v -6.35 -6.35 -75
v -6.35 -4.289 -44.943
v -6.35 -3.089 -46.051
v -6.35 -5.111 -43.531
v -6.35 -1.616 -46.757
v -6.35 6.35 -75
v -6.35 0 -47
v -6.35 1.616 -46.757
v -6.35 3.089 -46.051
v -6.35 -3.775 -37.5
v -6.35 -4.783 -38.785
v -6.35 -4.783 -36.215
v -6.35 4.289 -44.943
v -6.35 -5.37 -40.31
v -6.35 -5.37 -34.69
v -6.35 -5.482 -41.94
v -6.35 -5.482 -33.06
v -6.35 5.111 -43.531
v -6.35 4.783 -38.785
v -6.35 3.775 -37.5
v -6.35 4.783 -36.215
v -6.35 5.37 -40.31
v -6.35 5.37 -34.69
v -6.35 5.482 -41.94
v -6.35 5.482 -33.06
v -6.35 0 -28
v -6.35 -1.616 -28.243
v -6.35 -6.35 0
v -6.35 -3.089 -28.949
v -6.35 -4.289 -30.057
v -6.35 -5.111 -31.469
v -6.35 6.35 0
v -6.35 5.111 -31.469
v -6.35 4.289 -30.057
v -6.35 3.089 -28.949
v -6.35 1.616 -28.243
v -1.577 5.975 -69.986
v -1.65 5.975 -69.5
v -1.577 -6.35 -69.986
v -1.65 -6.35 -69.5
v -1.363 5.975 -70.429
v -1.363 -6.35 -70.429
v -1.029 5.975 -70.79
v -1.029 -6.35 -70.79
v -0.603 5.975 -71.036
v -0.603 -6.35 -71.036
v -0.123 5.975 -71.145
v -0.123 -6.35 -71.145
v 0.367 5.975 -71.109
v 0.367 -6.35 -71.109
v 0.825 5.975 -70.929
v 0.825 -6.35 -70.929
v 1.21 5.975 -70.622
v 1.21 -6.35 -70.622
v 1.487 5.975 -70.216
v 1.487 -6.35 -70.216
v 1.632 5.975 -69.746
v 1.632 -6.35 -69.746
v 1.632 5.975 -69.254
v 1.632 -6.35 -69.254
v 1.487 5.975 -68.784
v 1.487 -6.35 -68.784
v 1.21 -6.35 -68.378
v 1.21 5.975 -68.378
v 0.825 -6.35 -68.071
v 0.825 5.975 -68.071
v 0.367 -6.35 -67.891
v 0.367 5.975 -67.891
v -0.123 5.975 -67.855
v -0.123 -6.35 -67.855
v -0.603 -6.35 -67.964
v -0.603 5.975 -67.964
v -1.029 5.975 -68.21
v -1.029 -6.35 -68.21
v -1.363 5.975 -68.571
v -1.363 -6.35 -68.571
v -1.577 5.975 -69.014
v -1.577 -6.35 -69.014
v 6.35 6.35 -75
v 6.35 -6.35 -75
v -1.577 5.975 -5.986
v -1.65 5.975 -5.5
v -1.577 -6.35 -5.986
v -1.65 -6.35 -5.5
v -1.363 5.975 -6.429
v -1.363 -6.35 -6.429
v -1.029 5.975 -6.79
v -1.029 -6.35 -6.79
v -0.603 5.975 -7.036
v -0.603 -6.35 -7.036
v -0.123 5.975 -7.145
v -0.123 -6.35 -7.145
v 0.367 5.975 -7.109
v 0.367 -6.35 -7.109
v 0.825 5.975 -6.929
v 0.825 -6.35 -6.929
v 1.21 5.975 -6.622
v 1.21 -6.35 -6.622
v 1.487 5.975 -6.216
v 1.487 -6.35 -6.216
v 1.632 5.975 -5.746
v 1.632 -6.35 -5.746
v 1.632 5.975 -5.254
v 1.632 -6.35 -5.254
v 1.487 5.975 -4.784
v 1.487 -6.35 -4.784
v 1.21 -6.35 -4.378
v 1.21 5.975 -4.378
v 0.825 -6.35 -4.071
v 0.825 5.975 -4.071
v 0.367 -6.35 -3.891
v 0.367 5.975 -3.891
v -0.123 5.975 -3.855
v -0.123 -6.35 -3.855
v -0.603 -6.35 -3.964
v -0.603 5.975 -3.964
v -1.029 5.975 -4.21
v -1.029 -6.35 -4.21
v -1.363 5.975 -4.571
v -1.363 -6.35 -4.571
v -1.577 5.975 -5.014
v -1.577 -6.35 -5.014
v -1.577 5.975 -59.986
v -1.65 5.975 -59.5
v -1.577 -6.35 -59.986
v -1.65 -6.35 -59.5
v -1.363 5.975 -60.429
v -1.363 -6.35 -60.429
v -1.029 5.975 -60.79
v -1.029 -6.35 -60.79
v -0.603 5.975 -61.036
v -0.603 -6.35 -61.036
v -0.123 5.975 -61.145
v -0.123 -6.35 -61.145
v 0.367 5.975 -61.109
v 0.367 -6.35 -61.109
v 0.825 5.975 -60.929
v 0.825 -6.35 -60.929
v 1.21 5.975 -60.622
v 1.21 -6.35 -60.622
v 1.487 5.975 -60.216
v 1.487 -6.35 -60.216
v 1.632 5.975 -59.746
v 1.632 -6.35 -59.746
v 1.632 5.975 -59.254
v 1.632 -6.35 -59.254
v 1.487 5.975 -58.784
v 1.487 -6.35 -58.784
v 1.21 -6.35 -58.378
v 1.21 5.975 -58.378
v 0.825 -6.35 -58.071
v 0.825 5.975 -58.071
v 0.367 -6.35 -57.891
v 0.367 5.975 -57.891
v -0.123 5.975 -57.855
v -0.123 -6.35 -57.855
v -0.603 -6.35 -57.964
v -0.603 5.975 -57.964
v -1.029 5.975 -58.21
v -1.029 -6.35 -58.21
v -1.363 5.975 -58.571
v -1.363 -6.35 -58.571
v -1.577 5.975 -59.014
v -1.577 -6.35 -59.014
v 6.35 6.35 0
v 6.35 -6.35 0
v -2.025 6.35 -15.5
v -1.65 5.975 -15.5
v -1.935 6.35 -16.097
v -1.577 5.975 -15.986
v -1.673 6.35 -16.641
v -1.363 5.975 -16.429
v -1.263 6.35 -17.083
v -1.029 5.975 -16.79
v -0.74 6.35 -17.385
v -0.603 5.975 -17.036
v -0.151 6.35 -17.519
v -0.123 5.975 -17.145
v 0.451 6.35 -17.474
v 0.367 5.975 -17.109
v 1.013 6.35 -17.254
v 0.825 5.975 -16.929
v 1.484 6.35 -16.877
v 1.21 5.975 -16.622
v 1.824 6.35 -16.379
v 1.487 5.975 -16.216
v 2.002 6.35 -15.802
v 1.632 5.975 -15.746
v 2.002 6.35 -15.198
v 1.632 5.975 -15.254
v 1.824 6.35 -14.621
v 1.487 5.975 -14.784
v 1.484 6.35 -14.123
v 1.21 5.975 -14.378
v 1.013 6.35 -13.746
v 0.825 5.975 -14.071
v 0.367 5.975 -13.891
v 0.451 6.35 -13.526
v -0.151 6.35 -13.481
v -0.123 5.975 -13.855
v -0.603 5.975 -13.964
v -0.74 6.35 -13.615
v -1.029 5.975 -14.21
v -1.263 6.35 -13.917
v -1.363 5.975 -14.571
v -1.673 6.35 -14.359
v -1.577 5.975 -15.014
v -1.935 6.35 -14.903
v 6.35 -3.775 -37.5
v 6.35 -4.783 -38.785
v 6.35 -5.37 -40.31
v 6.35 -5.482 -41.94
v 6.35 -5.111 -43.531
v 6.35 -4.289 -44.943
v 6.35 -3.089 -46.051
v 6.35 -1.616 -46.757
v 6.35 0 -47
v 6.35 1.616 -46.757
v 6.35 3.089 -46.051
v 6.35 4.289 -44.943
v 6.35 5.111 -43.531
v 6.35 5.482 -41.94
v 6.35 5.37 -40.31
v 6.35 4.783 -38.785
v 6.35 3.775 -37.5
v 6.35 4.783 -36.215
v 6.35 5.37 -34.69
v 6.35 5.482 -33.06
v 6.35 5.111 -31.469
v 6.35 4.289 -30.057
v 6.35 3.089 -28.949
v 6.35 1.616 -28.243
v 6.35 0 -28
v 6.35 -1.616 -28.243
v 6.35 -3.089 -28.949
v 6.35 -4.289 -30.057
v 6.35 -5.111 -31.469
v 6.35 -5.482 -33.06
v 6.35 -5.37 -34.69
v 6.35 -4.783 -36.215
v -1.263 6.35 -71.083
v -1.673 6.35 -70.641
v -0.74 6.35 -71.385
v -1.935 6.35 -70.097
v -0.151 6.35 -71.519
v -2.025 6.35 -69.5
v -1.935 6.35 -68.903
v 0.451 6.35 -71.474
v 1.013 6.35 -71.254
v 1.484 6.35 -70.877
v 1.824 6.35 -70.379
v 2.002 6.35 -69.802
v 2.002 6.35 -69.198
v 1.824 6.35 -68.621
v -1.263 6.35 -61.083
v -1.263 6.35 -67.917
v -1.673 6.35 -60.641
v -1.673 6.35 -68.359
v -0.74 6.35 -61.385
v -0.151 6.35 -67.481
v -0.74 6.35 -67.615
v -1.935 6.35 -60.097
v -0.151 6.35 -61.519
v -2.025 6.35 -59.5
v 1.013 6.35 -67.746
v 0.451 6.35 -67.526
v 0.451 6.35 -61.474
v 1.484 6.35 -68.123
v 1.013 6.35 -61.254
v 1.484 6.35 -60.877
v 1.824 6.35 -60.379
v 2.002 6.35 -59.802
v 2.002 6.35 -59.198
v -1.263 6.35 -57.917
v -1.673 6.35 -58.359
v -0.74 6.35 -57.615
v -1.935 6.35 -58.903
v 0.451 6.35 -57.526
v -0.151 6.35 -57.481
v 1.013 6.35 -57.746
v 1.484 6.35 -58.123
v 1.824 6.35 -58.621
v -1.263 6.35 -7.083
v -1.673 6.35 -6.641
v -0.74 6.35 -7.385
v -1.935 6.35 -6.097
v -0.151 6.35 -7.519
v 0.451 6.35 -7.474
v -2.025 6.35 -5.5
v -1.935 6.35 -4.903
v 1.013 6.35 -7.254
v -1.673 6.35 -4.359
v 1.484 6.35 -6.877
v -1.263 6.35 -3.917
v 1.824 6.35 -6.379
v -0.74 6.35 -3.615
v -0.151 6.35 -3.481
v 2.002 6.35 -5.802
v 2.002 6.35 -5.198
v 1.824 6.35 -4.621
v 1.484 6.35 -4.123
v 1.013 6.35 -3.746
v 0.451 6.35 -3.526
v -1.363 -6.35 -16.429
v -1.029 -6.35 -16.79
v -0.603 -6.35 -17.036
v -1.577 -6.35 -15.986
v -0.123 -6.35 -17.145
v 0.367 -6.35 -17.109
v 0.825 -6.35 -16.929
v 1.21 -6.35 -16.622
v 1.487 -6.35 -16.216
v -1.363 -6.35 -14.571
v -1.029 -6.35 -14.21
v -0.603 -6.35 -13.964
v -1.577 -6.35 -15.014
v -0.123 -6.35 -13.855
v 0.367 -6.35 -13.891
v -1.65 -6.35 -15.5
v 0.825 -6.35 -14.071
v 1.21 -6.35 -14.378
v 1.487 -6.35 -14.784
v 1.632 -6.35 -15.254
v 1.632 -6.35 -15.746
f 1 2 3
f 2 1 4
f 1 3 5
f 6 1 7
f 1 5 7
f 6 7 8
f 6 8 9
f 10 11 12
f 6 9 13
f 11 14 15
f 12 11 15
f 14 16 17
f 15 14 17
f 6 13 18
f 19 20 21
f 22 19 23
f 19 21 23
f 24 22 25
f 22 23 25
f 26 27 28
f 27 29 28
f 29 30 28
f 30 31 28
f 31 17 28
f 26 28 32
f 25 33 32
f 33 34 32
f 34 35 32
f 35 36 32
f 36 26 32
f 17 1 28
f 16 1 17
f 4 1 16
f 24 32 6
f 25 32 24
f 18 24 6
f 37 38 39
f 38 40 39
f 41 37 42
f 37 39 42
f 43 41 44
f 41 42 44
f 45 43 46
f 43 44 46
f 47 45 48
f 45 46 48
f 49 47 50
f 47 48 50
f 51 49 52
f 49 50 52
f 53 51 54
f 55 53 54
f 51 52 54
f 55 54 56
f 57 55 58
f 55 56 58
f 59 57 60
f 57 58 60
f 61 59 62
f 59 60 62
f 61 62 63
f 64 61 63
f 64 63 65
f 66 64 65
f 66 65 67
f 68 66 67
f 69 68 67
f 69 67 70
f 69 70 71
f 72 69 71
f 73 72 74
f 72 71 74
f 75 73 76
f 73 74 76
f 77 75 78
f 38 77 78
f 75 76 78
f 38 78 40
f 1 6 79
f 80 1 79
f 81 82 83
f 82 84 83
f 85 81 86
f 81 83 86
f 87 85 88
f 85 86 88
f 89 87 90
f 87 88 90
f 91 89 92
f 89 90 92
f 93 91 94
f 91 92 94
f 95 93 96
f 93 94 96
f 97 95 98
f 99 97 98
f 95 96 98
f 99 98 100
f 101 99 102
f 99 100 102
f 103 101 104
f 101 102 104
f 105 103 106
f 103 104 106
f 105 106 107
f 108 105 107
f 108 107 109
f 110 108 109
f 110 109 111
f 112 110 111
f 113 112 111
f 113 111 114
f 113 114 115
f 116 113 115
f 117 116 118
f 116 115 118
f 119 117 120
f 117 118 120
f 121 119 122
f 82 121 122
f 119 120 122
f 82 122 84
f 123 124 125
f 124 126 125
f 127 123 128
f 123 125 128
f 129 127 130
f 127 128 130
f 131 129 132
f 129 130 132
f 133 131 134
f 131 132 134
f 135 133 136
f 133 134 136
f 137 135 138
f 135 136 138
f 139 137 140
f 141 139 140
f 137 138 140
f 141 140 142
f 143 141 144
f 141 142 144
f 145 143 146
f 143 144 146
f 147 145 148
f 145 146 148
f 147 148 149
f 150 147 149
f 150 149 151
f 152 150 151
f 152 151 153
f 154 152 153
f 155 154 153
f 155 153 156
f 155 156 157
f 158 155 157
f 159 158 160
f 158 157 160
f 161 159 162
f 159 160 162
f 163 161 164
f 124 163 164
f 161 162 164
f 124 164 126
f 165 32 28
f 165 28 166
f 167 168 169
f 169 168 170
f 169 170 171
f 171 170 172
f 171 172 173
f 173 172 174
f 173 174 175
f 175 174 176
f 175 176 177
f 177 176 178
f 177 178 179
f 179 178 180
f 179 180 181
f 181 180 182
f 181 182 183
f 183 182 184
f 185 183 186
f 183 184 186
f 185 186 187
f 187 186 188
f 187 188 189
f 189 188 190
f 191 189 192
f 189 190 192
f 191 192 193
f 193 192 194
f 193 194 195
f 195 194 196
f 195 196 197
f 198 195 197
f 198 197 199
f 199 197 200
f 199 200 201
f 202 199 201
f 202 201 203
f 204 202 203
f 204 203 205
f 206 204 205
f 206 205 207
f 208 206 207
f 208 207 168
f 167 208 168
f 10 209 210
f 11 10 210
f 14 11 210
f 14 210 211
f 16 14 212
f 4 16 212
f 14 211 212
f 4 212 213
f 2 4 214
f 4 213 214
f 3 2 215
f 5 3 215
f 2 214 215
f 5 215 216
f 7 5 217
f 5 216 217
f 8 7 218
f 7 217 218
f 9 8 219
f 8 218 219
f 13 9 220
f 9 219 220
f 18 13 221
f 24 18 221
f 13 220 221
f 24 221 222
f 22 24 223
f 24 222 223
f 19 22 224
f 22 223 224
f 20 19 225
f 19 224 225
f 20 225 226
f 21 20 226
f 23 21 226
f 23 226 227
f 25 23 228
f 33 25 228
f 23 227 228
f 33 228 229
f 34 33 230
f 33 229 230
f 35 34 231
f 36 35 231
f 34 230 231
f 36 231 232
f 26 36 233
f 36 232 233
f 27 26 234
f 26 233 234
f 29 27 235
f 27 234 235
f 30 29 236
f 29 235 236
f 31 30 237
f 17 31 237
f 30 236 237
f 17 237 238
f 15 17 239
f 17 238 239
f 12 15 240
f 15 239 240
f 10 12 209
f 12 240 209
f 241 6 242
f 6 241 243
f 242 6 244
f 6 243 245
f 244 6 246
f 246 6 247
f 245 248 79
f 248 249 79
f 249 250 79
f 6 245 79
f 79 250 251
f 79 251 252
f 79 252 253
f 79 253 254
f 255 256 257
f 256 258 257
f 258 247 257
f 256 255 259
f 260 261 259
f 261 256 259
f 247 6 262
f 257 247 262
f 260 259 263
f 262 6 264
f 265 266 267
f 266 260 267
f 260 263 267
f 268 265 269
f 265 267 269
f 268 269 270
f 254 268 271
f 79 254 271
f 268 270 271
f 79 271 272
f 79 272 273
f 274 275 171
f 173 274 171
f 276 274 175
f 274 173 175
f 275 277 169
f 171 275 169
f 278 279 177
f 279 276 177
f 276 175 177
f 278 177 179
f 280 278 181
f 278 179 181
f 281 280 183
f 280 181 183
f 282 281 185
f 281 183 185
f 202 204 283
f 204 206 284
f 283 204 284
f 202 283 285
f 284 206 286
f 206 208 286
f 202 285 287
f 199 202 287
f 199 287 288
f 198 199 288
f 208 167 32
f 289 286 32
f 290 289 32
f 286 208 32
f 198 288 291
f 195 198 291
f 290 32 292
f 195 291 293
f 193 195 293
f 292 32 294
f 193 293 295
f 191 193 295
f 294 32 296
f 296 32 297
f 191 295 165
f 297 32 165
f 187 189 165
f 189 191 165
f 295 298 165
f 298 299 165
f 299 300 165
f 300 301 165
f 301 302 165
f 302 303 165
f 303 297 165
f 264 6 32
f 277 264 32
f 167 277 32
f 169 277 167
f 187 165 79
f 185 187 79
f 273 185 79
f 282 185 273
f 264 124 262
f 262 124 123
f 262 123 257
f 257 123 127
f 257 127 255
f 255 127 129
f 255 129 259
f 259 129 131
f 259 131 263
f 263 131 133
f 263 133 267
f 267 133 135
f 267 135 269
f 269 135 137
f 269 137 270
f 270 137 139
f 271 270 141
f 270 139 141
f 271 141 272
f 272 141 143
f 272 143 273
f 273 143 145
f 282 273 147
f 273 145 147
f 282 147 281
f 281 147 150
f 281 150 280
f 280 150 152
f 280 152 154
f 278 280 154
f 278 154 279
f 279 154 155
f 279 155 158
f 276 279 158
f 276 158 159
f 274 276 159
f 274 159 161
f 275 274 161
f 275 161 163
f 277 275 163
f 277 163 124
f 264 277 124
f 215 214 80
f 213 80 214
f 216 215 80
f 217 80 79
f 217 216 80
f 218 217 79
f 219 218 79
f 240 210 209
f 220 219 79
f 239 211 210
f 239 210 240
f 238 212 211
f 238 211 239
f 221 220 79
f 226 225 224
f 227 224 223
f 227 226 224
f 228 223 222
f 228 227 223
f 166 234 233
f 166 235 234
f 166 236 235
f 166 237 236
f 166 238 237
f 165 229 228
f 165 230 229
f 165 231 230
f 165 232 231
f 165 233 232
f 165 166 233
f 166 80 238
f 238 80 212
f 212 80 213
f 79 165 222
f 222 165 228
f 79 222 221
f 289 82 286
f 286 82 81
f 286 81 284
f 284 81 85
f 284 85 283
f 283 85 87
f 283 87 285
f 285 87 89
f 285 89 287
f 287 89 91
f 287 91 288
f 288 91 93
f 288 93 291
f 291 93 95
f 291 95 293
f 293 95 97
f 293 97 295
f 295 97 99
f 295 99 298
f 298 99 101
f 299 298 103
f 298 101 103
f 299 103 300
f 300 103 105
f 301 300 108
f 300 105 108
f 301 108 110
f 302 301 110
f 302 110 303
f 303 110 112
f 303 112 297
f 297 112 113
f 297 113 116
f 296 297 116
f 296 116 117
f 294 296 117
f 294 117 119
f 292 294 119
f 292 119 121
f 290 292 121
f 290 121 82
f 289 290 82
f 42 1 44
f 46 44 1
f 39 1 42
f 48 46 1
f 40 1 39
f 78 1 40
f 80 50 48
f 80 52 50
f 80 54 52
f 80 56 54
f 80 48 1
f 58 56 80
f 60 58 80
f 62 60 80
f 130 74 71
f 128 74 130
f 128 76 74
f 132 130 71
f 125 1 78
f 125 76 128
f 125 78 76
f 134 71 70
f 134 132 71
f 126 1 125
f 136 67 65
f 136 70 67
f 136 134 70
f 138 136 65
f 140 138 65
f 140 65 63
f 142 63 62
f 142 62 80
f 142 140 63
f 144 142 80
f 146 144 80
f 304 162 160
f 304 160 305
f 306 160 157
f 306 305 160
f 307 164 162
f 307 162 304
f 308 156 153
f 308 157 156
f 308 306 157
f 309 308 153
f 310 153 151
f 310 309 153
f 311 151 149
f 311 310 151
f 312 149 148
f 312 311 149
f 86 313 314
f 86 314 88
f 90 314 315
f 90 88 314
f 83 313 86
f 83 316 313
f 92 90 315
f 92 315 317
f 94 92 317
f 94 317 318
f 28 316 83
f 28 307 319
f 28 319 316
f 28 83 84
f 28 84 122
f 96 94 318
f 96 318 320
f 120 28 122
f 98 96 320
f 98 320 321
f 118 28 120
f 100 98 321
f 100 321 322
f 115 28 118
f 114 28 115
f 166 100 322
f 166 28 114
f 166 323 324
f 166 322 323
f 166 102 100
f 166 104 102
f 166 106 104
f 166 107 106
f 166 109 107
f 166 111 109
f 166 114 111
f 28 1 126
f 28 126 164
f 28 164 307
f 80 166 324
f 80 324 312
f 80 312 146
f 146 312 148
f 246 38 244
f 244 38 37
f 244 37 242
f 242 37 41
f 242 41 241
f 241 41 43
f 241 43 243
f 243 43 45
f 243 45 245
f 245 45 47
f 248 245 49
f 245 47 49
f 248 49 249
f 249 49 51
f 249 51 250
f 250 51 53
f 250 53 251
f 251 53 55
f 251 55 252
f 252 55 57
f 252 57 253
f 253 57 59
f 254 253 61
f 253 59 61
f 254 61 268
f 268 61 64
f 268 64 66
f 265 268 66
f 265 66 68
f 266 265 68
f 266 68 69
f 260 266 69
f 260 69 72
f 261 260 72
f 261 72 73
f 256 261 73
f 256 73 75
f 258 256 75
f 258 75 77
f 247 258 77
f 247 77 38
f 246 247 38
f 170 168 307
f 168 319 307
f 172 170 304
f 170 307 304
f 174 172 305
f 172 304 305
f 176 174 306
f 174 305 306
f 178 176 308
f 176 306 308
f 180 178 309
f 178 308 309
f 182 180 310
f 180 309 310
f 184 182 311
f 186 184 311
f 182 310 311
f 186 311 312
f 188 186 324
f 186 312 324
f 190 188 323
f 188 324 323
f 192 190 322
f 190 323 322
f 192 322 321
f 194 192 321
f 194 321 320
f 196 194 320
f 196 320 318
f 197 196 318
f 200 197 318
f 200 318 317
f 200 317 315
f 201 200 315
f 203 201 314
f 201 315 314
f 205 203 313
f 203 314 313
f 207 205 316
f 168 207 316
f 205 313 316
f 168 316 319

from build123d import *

# Parameters (mm, degrees)
ESBO_O2_W                       = 12.7
ESBO_O2_H                       = 12.7
RESSALTO_EXTRUS_O2_DEPTH        = 75
CORTE_EXTRUS_O1_DEPTH           = 77.33225072
FURO_ROSCADO_DE_M41_D           = 3.3
FURO_ROSCADO_DE_M41_CSINK_D     = 4.05
FURO_ROSCADO_DE_M41_CSINK_ANGLE = 90


with BuildPart() as part:
    # Esboço2 → Ressalto-extrusão2 (new body)
    with BuildSketch(Plane.XY):
        Rectangle(ESBO_O2_W, ESBO_O2_H)
    extrude(amount=-RESSALTO_EXTRUS_O2_DEPTH)

    # Esboço3 → Corte-extrusão1 (cut, through all)
    with BuildSketch(Plane(origin=(6.35, 0, 0), x_dir=(0, 0, -1), z_dir=(1, 0, 0))):
        with BuildLine():
            ThreePointArc((37.5, -3.774917218), (47, 0), (37.5, 3.774917218))
            ThreePointArc((37.5, 3.774917218), (28, 0), (37.5, -3.774917218))
        make_face()
    extrude(amount=-CORTE_EXTRUS_O1_DEPTH, mode=Mode.SUBTRACT)

    # Furo roscado de M41 (through all)
    with Locations(Plane(origin=(0, 6.35, 0), x_dir=(1, 0, 0), z_dir=(0, 1, 0))):
        with Locations((0, 5.5), (0, 15.5), (0, 59.5), (0, 69.5)):
            CounterSinkHole(FURO_ROSCADO_DE_M41_D / 2, FURO_ROSCADO_DE_M41_CSINK_D / 2, counter_sink_angle=FURO_ROSCADO_DE_M41_CSINK_ANGLE)


solid = part.part
